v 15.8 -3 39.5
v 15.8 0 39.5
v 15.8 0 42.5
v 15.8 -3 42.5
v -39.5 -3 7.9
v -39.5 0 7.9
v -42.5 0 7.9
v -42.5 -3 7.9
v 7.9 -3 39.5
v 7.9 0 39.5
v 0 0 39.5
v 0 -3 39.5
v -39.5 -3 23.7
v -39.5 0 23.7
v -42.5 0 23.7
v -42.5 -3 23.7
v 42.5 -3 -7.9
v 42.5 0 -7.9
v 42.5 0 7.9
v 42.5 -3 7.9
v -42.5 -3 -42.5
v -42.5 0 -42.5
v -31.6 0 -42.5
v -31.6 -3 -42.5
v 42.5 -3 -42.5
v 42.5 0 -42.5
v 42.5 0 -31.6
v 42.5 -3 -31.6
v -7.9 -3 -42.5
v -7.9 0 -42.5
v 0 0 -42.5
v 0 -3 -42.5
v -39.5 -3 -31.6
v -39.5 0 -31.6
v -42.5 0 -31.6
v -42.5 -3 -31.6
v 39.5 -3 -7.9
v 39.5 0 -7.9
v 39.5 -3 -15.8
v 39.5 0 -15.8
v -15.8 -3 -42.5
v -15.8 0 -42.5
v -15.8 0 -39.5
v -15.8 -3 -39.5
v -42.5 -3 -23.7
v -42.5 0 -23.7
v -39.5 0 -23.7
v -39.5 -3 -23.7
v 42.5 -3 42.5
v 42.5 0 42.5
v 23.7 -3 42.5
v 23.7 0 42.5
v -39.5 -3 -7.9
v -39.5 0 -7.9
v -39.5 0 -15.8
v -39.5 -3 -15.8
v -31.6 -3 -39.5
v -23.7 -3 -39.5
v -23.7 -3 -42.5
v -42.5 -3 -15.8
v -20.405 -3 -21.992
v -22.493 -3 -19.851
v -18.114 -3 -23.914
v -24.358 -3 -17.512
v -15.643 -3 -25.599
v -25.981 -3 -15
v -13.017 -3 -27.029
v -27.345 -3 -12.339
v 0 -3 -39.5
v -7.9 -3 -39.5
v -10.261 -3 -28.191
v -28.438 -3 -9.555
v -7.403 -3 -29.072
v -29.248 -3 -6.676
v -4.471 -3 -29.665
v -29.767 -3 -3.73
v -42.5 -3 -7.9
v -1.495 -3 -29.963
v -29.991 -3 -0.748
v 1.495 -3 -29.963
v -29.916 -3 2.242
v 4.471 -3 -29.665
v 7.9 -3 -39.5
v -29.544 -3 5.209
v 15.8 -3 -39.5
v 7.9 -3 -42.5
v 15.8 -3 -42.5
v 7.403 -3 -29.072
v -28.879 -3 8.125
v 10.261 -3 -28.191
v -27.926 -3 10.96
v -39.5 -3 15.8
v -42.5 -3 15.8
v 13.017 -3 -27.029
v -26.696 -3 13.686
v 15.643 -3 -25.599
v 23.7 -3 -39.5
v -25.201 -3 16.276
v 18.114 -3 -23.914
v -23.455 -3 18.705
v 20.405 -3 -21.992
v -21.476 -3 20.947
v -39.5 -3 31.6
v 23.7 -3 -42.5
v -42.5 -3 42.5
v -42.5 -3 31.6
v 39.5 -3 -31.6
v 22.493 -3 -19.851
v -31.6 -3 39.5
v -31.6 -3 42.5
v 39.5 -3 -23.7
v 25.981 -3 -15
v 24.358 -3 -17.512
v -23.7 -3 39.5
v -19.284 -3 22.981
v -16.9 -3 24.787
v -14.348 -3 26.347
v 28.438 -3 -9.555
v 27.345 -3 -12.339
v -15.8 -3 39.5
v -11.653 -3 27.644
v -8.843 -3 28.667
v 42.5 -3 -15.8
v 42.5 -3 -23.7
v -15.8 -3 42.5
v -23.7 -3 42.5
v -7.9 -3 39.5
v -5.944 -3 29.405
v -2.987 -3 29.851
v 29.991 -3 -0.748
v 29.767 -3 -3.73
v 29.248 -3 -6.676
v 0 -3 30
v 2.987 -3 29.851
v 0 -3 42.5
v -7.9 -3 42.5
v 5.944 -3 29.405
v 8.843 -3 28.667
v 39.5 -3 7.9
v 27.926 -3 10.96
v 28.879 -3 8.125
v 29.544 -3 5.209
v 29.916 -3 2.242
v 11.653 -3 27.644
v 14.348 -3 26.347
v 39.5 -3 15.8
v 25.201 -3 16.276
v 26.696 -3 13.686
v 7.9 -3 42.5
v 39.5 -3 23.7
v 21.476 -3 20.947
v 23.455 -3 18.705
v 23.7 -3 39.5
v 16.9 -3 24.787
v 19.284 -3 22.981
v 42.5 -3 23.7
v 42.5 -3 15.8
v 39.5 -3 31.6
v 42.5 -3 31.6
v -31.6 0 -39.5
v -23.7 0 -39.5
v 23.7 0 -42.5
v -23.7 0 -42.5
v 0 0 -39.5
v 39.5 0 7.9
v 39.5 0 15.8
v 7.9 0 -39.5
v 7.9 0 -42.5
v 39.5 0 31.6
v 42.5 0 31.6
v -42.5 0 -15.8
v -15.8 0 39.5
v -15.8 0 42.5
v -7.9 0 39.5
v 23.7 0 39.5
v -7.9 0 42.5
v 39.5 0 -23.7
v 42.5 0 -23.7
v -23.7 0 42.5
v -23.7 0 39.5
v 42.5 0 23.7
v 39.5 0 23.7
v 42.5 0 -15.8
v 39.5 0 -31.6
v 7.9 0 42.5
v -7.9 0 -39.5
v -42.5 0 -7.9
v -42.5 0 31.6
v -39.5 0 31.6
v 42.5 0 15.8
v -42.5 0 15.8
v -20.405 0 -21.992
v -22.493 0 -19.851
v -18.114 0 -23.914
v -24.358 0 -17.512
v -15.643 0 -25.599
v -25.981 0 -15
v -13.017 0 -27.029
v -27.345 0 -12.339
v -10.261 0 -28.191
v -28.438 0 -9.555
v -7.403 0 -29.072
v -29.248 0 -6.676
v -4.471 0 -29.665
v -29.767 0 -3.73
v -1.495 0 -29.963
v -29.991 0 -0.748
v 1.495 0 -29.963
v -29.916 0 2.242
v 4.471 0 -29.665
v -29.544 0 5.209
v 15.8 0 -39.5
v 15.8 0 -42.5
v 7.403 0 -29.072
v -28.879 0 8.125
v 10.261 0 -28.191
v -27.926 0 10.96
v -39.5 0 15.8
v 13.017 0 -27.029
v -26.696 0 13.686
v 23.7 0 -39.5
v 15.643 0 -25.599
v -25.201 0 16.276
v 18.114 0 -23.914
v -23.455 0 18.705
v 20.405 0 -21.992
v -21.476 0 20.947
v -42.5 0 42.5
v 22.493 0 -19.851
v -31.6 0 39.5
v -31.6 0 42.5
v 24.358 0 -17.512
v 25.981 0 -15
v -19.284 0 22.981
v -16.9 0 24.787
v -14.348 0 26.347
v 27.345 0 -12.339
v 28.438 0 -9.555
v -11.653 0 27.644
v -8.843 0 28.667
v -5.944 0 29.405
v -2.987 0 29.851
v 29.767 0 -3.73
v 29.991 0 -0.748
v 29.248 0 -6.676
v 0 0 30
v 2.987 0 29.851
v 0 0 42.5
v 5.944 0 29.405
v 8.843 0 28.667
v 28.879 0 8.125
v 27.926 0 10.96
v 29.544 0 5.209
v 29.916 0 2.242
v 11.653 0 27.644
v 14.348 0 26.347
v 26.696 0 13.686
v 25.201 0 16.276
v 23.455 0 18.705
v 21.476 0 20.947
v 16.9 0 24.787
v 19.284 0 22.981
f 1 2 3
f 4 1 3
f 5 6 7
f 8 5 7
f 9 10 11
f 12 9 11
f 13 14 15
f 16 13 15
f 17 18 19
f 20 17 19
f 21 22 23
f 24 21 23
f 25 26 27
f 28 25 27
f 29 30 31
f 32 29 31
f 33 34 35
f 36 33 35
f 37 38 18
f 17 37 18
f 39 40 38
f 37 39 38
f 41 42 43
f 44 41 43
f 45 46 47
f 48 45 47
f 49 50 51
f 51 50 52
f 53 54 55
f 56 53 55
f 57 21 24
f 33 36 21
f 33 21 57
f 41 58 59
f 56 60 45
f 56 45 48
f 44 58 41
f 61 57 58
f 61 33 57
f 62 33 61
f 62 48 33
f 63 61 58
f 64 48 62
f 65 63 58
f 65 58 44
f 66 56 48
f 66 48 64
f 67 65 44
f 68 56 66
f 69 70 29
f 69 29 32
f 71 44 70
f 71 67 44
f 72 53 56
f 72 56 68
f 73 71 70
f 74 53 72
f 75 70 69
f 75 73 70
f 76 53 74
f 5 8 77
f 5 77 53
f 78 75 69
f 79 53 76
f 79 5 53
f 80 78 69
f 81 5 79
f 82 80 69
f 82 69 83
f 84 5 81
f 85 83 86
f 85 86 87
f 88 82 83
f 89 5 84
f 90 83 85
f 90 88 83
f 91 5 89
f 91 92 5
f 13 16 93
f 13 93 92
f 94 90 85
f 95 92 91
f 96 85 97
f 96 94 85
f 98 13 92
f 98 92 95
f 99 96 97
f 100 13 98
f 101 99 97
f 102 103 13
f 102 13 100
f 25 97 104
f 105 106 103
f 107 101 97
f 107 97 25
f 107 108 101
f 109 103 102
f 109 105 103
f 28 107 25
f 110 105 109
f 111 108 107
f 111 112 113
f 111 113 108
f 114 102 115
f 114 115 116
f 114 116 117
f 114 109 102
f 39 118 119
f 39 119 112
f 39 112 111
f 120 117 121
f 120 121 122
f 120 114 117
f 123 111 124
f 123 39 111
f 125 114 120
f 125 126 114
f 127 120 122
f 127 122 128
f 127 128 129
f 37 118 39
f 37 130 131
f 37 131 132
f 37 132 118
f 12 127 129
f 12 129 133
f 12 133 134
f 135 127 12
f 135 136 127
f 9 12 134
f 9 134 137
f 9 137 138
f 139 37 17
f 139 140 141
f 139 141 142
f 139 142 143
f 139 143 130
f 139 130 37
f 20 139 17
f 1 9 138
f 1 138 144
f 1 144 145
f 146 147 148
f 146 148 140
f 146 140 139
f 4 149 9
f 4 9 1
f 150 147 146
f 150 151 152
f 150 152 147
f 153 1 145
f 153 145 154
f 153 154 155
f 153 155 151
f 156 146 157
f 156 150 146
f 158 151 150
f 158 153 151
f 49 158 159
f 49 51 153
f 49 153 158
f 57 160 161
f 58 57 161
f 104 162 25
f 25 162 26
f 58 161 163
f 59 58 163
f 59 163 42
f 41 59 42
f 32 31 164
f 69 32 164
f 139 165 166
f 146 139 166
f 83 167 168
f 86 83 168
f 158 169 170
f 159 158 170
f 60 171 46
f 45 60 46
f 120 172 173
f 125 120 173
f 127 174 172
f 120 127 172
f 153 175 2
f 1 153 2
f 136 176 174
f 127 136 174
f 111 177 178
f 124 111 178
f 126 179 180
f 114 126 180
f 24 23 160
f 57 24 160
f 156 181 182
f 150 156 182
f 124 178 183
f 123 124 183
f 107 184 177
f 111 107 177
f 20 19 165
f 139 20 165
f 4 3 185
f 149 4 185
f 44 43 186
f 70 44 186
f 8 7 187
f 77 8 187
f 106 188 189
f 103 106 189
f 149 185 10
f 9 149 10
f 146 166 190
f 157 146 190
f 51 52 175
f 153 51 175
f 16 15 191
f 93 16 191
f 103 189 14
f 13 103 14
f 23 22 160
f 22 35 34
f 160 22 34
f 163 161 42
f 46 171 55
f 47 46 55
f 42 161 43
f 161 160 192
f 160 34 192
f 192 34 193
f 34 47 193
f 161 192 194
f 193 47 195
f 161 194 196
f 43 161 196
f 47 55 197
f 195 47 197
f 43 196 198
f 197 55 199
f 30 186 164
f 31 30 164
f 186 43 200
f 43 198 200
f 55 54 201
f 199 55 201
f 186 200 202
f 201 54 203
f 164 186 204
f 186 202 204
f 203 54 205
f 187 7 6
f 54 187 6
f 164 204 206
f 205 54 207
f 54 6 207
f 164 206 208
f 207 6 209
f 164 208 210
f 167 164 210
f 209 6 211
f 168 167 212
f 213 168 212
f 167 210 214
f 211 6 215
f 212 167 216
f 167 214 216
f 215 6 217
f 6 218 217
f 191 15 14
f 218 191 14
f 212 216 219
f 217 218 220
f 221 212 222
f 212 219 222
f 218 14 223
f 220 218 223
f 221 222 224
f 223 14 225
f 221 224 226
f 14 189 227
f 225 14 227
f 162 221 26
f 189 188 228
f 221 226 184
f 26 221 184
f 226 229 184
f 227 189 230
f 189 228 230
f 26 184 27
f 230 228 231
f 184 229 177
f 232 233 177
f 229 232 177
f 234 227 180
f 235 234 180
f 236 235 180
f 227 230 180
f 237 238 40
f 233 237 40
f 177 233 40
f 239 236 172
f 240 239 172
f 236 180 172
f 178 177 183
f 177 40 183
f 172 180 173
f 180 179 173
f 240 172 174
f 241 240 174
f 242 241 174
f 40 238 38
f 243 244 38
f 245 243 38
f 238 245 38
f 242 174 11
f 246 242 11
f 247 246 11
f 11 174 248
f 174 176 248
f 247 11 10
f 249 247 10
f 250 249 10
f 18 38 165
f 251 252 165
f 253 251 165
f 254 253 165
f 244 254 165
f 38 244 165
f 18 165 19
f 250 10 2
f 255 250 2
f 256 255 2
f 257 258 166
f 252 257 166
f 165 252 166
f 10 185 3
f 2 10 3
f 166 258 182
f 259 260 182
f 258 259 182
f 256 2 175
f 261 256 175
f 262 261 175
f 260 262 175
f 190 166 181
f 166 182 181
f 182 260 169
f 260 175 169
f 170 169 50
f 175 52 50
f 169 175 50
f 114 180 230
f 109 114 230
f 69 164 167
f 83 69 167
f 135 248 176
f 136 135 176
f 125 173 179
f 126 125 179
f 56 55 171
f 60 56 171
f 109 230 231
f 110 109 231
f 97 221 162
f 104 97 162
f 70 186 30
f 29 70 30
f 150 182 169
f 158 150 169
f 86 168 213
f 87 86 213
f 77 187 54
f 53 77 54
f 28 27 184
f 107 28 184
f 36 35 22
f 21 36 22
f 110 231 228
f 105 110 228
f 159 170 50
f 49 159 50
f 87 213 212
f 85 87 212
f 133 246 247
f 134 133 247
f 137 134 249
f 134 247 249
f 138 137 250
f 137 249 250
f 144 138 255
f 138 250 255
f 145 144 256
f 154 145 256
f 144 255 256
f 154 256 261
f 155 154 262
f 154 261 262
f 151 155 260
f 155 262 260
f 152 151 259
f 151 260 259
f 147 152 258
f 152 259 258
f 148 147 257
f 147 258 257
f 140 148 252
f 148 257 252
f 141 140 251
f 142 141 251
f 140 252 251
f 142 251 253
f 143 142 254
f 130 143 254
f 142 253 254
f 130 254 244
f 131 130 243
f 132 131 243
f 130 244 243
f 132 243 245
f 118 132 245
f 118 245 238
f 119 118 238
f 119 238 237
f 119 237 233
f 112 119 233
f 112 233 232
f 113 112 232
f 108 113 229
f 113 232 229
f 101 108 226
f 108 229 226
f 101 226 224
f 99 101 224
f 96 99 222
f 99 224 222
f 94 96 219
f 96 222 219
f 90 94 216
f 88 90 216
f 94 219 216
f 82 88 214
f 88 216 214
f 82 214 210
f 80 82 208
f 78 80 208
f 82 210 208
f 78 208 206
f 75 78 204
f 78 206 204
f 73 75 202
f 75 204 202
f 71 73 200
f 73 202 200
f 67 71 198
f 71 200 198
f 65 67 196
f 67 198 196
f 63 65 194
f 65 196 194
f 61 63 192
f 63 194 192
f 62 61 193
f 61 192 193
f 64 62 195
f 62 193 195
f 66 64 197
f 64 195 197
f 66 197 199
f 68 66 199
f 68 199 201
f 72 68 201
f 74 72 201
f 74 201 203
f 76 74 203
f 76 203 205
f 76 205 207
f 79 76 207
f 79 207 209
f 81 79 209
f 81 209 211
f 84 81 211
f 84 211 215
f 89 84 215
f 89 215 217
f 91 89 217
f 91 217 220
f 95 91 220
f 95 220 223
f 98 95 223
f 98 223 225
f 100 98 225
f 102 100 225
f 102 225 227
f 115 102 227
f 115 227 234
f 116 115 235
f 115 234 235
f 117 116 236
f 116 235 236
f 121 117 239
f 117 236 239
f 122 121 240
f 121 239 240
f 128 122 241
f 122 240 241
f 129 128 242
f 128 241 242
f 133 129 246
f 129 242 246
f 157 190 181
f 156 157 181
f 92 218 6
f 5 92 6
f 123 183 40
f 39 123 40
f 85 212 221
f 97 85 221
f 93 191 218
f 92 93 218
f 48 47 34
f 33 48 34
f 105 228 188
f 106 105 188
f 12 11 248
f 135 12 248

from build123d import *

# Parameters (mm, degrees)
F1_DEPTH = 3


with BuildPart() as f1:
    # F0 (on Front) → F1 (new body)
    with BuildSketch(Plane.XZ):
        Polygon((-42.5, -31.6), (-42.5, -42.5), (-31.6, -42.5), (-31.6, -39.5), (-23.7, -39.5), (-23.7, -42.5), (-15.8, -42.5), (-15.8, -39.5), (-7.9, -39.5), (-7.9, -42.5), (0, -42.5), (0, -39.5), (7.9, -39.5), (7.9, -42.5), (15.8, -42.5), (15.8, -39.5), (23.7, -39.5), (23.7, -42.5), (42.5, -42.5), (42.5, -31.6), (39.5, -31.6), (39.5, -23.7), (42.5, -23.7), (42.5, -15.8), (39.5, -15.8), (39.5, -7.9), (42.5, -7.9), (42.5, 0), (42.5, 7.9), (39.5, 7.9), (39.5, 15.8), (42.5, 15.8), (42.5, 23.7), (39.5, 23.7), (39.5, 31.6), (42.5, 31.6), (42.5, 42.5), (23.7, 42.5), (23.7, 39.5), (15.8, 39.5), (15.8, 42.5), (7.9, 42.5), (7.9, 39.5), (0, 39.5), (0, 42.5), (-7.9, 42.5), (-7.9, 39.5), (-15.8, 39.5), (-15.8, 42.5), (-23.7, 42.5), (-23.7, 39.5), (-31.6, 39.5), (-31.6, 42.5), (-42.5, 42.5), (-42.5, 31.6), (-39.5, 31.6), (-39.5, 23.7), (-42.5, 23.7), (-42.5, 15.8), (-39.5, 15.8), (-39.5, 7.9), (-42.5, 7.9), (-42.5, 0), (-42.5, -7.9), (-39.5, -7.9), (-39.5, -15.8), (-42.5, -15.8), (-42.5, -23.7), (-39.5, -23.7), (-39.5, -31.6), align=None)
        with BuildLine():
            ThreePointArc((0, -30), (-30, 0), (0, 30))
            ThreePointArc((0, 30), (30, 0), (0, -30))
        make_face(mode=Mode.SUBTRACT)
    extrude(amount=F1_DEPTH)


solid = f1.part
